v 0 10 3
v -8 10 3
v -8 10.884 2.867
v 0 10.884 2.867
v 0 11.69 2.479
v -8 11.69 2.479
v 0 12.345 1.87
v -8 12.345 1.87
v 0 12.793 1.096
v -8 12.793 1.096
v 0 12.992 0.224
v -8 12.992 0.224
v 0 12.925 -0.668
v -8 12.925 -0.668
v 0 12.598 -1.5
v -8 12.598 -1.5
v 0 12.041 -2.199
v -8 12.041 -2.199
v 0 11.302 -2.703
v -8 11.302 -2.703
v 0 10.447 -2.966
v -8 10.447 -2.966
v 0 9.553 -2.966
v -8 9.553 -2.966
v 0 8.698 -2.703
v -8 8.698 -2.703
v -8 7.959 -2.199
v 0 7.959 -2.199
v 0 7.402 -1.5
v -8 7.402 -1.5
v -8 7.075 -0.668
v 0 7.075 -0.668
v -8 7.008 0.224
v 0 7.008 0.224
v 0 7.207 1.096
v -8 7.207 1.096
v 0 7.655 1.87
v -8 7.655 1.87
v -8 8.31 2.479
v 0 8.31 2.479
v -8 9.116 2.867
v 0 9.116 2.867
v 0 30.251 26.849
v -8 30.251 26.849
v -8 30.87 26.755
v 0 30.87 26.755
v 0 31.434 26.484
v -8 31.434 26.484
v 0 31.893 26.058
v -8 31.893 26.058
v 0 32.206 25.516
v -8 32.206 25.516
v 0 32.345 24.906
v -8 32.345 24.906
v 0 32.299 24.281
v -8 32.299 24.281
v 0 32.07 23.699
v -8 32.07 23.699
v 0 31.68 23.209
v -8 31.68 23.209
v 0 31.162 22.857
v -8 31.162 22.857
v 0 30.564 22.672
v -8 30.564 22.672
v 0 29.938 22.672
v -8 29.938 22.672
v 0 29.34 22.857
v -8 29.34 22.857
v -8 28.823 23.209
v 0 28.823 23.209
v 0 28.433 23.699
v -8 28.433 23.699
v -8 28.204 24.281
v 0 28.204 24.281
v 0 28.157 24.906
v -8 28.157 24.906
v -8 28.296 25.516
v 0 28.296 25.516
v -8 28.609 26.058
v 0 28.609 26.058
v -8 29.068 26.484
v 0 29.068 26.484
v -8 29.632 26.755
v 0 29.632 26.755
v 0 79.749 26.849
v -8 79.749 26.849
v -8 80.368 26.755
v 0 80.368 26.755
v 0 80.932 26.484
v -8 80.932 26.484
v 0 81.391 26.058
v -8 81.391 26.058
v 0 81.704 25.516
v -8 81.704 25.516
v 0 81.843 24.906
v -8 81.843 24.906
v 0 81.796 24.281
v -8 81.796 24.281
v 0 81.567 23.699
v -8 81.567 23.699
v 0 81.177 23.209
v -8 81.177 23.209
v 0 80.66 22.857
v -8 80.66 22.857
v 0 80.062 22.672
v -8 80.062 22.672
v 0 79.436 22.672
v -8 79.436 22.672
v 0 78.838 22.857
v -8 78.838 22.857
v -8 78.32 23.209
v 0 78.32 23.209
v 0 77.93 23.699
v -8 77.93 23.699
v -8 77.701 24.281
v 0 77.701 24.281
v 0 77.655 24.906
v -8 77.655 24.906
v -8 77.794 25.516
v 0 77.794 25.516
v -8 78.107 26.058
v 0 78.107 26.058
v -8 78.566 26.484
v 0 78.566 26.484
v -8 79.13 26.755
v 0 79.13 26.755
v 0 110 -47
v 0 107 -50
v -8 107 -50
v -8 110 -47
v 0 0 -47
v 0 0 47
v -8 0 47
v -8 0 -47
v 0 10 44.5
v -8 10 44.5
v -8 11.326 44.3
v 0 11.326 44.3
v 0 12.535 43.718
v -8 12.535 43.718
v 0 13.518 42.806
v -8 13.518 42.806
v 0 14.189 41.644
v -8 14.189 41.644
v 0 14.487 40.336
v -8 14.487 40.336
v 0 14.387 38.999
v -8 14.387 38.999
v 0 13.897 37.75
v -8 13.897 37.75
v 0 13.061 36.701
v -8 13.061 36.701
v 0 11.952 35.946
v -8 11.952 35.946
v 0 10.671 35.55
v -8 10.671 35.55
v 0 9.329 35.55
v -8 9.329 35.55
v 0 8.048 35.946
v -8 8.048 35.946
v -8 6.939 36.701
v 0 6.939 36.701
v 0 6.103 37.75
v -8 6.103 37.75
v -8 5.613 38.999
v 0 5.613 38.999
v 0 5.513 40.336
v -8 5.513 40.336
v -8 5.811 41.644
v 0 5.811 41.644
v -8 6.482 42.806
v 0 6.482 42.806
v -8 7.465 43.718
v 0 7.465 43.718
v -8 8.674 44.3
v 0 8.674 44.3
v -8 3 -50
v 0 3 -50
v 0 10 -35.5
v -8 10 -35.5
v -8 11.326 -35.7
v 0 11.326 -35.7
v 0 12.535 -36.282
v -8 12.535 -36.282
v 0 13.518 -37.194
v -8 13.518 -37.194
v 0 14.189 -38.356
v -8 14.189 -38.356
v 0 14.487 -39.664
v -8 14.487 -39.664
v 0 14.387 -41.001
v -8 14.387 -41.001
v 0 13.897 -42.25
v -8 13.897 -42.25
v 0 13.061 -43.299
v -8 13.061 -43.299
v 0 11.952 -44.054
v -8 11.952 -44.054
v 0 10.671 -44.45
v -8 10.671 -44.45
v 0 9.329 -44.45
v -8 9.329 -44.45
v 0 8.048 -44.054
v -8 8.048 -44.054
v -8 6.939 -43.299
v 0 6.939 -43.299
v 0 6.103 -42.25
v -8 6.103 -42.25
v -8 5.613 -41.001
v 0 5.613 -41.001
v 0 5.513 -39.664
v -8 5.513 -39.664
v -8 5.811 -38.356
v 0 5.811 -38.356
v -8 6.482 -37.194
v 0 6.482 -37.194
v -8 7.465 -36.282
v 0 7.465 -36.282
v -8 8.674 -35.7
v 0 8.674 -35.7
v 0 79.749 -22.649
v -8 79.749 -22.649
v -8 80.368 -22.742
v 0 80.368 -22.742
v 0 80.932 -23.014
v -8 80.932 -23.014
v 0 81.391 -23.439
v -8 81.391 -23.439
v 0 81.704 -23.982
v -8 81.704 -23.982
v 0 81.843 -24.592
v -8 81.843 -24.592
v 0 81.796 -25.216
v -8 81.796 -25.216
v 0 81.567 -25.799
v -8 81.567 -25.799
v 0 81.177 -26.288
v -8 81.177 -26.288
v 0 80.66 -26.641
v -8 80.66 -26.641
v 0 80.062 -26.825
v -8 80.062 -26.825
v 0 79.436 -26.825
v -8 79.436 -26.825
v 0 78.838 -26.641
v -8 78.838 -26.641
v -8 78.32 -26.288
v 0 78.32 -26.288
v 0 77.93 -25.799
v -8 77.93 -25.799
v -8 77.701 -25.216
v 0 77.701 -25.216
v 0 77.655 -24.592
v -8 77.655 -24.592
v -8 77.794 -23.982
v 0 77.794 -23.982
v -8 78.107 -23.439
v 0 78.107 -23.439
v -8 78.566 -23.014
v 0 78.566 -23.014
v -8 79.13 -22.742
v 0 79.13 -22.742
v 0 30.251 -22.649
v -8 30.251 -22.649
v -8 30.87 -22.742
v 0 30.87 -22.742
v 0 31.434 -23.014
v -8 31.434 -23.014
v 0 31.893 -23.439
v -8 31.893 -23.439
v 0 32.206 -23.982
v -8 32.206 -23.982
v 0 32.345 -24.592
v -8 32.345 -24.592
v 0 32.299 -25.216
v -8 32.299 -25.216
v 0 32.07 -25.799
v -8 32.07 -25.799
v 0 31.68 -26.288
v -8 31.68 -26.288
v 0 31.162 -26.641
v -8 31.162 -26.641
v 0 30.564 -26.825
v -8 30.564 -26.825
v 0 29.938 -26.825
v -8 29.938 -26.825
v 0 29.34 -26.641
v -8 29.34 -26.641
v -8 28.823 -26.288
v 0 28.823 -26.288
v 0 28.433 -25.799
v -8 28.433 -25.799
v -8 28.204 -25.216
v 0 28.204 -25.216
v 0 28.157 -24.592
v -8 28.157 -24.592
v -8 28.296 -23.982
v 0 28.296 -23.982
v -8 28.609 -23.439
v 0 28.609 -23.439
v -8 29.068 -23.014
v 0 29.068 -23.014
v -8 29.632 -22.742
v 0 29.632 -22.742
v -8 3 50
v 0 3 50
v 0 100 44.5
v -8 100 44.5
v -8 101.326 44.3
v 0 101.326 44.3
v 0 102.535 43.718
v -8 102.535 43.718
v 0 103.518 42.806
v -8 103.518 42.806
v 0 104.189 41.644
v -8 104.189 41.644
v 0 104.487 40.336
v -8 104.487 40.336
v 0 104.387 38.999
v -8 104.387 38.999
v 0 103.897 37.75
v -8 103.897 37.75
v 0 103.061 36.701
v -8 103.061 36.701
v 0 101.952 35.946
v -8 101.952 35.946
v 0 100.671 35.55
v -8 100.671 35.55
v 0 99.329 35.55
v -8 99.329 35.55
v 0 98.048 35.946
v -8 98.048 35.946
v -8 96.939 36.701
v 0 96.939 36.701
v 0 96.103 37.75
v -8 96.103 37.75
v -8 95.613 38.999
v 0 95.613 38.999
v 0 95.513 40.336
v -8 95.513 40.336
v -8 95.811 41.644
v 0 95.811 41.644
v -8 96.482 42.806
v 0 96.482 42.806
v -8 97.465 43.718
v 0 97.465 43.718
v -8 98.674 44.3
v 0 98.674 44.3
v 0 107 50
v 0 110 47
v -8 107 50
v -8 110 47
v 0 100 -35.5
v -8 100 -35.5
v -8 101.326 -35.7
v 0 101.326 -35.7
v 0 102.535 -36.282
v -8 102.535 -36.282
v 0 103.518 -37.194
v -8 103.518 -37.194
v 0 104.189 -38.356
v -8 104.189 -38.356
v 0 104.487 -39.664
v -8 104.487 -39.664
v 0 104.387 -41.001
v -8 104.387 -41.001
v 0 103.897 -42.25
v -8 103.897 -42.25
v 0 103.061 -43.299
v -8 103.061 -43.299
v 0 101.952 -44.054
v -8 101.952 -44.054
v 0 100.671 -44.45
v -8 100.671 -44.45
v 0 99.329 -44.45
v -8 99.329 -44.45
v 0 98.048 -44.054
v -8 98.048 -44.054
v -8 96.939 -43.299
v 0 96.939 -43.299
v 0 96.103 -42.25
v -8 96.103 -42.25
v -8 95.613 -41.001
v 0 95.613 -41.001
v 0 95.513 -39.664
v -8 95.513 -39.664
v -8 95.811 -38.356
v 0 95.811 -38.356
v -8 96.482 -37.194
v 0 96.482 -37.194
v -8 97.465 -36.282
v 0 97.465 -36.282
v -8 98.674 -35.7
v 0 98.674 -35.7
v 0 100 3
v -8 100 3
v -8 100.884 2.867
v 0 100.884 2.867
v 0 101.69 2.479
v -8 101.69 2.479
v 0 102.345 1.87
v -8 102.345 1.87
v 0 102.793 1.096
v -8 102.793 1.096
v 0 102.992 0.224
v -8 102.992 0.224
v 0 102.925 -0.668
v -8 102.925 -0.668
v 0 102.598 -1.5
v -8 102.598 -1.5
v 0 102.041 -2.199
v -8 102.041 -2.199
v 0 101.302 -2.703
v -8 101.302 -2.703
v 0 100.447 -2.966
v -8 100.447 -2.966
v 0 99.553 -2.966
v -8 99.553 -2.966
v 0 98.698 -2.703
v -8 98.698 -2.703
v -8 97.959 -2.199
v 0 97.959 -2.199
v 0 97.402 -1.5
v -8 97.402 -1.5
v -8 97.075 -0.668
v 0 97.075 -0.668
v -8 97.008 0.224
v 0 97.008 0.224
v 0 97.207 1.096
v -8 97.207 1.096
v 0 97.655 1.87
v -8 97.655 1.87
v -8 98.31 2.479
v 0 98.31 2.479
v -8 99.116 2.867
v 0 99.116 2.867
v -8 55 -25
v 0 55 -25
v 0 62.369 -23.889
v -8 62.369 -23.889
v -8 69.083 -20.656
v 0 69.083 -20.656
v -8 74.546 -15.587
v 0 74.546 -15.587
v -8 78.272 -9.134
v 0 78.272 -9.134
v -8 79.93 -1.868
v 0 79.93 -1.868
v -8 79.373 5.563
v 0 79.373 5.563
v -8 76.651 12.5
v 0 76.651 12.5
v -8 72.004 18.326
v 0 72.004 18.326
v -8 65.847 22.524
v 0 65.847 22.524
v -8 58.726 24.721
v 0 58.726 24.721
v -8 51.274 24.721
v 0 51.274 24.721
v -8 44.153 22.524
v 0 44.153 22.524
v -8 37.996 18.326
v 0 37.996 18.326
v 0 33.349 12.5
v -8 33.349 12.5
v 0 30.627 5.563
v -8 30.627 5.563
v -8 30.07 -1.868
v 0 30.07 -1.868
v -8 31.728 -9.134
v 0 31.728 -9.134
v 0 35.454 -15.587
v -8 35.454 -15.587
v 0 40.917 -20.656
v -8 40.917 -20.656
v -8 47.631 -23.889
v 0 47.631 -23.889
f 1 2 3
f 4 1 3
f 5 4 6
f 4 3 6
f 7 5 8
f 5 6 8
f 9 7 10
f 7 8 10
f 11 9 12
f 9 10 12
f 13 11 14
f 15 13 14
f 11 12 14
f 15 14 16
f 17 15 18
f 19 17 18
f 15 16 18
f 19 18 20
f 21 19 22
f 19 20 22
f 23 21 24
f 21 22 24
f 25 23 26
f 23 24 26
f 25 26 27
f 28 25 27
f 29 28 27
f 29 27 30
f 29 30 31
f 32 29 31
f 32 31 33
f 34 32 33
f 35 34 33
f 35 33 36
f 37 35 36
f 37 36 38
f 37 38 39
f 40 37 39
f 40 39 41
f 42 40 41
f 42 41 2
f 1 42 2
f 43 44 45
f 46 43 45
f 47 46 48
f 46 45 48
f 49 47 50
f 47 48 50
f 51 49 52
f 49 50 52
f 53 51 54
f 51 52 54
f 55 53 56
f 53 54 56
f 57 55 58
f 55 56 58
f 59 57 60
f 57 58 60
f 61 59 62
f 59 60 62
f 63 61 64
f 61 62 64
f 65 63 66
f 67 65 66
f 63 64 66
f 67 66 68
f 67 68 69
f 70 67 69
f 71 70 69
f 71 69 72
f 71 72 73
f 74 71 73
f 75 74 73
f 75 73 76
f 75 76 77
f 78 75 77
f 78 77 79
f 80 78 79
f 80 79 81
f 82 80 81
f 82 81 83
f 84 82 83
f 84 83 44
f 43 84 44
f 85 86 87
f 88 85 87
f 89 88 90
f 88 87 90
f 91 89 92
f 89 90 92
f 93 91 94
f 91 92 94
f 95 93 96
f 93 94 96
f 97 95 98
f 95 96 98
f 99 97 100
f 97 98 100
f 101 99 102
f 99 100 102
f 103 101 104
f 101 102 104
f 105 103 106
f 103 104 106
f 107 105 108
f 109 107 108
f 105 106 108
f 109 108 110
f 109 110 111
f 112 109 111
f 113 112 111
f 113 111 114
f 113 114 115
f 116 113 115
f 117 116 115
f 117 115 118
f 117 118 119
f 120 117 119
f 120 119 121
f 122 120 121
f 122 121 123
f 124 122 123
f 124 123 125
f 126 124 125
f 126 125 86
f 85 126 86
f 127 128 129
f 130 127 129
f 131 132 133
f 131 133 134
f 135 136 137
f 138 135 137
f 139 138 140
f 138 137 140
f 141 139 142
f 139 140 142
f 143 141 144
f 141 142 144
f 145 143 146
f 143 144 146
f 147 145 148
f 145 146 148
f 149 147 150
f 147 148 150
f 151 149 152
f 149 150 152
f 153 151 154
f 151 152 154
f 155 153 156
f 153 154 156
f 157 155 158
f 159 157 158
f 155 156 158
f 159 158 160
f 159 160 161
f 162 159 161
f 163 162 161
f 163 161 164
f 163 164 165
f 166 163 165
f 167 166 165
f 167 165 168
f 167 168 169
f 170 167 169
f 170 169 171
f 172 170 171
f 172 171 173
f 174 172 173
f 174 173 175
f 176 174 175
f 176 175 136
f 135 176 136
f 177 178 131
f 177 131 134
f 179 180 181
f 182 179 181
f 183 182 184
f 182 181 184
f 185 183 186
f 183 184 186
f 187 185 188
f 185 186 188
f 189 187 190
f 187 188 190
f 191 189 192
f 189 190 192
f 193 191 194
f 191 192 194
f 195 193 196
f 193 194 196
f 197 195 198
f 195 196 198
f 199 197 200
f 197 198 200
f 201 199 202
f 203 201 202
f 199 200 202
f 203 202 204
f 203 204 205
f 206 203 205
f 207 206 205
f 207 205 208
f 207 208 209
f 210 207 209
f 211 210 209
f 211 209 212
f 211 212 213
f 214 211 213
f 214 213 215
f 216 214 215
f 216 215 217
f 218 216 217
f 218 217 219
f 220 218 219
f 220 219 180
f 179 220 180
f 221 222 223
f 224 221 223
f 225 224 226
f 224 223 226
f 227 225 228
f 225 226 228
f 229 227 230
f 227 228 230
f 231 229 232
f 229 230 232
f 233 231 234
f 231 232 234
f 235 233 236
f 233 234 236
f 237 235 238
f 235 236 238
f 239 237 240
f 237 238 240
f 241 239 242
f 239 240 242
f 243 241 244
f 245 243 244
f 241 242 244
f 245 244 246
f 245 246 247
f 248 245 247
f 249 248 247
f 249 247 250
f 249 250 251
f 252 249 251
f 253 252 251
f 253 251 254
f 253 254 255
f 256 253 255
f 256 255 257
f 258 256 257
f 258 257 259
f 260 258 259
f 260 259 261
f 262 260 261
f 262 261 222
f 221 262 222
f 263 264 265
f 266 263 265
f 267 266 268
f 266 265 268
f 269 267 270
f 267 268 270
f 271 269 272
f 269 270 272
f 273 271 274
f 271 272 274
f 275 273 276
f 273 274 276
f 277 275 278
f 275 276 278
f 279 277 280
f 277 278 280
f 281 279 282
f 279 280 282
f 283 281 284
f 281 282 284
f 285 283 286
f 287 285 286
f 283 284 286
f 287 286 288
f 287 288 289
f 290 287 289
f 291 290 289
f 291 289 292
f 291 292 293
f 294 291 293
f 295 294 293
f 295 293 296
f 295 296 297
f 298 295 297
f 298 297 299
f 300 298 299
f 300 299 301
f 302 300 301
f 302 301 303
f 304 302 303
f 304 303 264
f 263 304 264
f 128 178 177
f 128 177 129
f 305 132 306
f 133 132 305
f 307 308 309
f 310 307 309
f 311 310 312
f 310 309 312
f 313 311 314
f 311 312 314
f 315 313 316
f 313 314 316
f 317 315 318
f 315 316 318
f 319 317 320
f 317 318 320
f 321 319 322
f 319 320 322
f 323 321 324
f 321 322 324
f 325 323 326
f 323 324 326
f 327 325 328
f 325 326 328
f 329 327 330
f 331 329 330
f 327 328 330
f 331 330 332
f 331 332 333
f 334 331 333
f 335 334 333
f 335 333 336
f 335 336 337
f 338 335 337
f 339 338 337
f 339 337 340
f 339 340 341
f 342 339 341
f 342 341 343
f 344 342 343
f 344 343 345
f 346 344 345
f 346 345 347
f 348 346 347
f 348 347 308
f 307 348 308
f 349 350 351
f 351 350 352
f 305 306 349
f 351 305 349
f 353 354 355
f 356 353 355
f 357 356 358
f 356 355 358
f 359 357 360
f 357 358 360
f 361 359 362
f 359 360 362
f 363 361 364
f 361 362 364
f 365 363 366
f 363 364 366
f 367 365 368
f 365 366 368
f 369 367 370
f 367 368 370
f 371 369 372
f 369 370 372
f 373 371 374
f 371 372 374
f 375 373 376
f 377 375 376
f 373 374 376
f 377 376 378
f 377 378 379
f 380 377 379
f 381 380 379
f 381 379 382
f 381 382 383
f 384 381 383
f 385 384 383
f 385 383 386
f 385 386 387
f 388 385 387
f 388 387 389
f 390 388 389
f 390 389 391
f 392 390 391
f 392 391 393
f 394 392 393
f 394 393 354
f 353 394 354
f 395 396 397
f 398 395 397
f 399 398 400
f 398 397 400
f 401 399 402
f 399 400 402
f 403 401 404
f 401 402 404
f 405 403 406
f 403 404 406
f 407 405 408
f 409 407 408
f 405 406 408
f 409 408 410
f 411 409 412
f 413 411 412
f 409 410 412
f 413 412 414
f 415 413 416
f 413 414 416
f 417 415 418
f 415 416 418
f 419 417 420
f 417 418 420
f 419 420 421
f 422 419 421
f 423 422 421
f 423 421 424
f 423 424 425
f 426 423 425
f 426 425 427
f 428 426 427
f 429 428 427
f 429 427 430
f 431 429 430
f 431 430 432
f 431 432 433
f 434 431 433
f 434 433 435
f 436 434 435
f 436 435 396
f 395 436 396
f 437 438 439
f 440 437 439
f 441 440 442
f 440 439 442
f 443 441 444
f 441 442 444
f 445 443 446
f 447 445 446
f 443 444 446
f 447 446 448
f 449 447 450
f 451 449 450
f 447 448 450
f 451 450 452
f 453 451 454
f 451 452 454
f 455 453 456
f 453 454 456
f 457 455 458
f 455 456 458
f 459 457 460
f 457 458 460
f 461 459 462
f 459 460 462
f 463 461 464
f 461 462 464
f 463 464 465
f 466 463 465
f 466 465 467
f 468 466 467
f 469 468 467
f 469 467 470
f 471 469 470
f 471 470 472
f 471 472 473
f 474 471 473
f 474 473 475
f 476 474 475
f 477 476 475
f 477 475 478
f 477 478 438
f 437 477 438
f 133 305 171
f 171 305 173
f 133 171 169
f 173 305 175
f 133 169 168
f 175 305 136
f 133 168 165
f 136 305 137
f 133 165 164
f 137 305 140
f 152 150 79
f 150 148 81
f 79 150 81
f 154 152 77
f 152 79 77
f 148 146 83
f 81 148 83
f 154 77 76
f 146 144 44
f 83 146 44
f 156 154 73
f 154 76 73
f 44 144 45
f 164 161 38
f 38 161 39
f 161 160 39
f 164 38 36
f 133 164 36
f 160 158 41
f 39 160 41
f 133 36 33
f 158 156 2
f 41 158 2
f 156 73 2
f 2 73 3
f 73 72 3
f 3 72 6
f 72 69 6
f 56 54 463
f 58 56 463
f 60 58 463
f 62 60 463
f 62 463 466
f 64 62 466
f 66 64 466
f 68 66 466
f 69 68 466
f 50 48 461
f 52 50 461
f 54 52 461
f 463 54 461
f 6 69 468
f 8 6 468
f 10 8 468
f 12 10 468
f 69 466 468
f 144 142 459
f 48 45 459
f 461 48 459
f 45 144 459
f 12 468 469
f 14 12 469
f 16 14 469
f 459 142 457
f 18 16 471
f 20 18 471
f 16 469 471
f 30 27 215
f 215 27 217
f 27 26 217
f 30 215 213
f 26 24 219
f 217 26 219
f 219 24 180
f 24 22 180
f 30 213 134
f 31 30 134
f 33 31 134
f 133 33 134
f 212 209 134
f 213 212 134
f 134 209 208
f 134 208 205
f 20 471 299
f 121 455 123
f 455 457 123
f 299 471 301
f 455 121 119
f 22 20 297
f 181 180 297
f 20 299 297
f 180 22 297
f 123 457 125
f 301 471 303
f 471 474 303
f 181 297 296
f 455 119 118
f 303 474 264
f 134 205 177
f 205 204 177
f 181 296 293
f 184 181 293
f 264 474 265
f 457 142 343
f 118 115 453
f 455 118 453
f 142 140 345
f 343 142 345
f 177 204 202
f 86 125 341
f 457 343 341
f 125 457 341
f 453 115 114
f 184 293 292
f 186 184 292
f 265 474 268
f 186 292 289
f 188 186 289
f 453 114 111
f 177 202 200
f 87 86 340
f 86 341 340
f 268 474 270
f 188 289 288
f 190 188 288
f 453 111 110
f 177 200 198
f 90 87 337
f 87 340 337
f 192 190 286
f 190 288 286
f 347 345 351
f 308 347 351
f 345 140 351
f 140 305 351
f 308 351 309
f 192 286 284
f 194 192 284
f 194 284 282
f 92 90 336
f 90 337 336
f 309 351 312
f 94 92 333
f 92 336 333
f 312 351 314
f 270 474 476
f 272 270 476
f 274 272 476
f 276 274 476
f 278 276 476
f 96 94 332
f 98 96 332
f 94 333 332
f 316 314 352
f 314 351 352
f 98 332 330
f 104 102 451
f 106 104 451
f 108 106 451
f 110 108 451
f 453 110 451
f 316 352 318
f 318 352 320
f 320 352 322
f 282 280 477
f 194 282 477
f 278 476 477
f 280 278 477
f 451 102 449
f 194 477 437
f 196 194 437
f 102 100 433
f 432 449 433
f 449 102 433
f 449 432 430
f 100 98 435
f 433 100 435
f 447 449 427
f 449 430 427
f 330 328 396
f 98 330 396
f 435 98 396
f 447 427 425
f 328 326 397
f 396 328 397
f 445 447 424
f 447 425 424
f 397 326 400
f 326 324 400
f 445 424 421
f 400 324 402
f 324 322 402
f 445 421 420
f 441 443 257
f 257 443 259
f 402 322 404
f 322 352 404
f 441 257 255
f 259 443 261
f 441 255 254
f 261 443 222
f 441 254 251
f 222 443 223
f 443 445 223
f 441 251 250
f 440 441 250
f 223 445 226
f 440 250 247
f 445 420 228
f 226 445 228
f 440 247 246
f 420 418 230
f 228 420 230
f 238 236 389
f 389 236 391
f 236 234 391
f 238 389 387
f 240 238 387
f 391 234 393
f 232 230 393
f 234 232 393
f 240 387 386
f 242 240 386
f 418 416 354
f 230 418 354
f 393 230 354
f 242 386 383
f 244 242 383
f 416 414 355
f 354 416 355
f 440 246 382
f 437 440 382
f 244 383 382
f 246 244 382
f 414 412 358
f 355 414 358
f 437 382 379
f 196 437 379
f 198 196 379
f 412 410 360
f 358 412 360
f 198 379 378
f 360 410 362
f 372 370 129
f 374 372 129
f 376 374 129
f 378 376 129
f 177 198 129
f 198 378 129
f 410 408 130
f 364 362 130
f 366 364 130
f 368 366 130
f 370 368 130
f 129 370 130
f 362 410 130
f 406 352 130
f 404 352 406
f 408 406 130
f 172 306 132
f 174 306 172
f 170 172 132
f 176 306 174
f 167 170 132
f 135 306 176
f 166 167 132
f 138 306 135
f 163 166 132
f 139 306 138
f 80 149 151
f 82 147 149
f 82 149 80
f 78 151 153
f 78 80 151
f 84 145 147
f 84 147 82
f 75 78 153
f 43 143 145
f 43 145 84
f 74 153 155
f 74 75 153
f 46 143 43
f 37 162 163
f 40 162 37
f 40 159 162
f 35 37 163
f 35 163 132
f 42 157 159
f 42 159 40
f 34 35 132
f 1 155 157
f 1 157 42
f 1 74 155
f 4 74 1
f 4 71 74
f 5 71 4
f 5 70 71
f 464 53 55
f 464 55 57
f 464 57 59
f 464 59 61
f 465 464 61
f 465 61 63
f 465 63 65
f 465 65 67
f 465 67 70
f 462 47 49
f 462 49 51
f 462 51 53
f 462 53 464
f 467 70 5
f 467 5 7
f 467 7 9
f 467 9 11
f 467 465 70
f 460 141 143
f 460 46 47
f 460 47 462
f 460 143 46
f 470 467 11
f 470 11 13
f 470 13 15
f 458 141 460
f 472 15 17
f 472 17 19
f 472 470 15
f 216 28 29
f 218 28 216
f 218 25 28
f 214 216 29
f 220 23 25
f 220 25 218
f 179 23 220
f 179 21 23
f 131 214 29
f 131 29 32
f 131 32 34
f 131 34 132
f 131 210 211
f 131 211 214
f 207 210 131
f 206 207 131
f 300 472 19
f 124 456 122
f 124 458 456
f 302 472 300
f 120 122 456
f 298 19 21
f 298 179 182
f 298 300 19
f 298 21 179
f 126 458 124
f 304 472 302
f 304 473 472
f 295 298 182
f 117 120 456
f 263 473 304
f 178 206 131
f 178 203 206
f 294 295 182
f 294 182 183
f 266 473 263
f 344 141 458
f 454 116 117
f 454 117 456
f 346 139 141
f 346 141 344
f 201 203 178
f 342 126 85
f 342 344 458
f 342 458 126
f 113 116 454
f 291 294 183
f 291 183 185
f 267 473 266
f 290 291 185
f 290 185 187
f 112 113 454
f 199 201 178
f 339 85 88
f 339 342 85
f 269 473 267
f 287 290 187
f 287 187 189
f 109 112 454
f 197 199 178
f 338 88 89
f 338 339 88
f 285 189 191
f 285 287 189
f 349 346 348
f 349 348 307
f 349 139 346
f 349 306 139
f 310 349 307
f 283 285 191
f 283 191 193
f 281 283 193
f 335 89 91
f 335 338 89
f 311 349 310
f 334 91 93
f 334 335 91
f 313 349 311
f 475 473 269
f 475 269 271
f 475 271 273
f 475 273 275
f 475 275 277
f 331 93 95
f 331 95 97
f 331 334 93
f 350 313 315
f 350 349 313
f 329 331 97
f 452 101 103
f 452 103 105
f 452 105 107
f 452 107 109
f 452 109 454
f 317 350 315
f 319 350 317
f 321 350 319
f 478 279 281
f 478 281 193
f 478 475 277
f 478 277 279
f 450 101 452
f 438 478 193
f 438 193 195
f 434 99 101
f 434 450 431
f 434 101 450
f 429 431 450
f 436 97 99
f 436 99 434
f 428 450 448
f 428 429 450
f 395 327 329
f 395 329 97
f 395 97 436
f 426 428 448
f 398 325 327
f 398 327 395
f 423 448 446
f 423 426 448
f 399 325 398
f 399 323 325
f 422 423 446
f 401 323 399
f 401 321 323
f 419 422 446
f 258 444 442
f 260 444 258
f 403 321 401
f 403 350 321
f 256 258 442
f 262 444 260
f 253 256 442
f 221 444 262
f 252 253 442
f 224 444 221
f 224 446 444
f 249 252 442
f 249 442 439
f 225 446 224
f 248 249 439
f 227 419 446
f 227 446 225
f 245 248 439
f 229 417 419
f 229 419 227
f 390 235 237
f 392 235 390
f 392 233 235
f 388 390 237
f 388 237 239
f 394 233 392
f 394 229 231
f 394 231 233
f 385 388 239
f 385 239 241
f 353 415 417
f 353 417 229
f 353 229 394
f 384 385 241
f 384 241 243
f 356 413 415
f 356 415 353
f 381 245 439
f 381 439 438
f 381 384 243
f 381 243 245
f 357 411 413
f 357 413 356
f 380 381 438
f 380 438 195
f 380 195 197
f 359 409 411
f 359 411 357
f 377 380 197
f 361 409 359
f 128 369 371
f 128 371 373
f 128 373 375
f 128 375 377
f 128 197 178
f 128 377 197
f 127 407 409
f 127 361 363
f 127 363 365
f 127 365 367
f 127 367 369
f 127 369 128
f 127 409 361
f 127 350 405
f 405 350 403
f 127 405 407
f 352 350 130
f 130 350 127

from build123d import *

# Parameters (mm, degrees)
SKETCH2_W                = 100
SKETCH2_H                = 110
BOSS_EXTRUDE1_DEPTH      = 8
SKETCH3_R                = 25
CUT_EXTRUDE1_DEPTH       = 9
SKETCH8_R                = 3
CUT_EXTRUDE2_DEPTH       = 9
F_9_0_9_DIAMETER_HOLE1_D = 9
M5X0_8_TAPPED_HOLE1_D    = 4.2
CHAMFER1_SIZE            = 3


with BuildPart() as part:
    # Sketch2 → Boss-Extrude1 (new body)
    with BuildSketch(Plane(origin=(0, 0, 0), x_dir=(0, 0, -1), z_dir=(1, 0, 0))):
        with Locations((0, 55)):
            Rectangle(SKETCH2_W, SKETCH2_H)
    extrude(amount=-BOSS_EXTRUDE1_DEPTH)

    # Sketch3 → Cut-Extrude1 (cut, through all)
    with BuildSketch(Plane(origin=(0, 0, 0), x_dir=(0, 0, -1), z_dir=(1, 0, 0))):
        with Locations((0, 55)):
            Circle(SKETCH3_R)
    extrude(amount=-CUT_EXTRUDE1_DEPTH, mode=Mode.SUBTRACT)

    # Sketch8 → Cut-Extrude2 (cut, through all)
    with BuildSketch(Plane.ZY.offset(8)):
        with Locations((0, 10)):
            Circle(SKETCH8_R)
        with Locations((0, 100)):
            Circle(SKETCH8_R)
    extrude(amount=-CUT_EXTRUDE2_DEPTH, mode=Mode.SUBTRACT)

    # Ø9.0 (9) Diameter Hole1 (through all)
    with Locations(Plane(origin=(0, 0, 0), x_dir=(0, 0, -1), z_dir=(1, 0, 0))):
        with Locations((-40, 100), (-40, 10), (40, 10), (40, 100)):
            Hole(F_9_0_9_DIAMETER_HOLE1_D / 2)

    # M5x0.8 Tapped Hole1 (through all)
    with Locations(Plane(origin=(0, 0, 0), x_dir=(0, 0, -1), z_dir=(1, 0, 0))):
        with Locations((24.748737342, 79.748737342), (-24.748737342, 79.748737342), (-24.748737342, 30.251262658), (24.748737342, 30.251262658)):
            Hole(M5X0_8_TAPPED_HOLE1_D / 2)

    # Chamfer1
    chamfer1_edges = [part.edges().sort_by_distance(p)[0] for p in [
        (-4, 0, -50),
        (-4, 0, 50),
        (-4, 110, 50),
        (-4, 110, -50),
    ]]
    chamfer(chamfer1_edges, length=CHAMFER1_SIZE)


solid = part.part
